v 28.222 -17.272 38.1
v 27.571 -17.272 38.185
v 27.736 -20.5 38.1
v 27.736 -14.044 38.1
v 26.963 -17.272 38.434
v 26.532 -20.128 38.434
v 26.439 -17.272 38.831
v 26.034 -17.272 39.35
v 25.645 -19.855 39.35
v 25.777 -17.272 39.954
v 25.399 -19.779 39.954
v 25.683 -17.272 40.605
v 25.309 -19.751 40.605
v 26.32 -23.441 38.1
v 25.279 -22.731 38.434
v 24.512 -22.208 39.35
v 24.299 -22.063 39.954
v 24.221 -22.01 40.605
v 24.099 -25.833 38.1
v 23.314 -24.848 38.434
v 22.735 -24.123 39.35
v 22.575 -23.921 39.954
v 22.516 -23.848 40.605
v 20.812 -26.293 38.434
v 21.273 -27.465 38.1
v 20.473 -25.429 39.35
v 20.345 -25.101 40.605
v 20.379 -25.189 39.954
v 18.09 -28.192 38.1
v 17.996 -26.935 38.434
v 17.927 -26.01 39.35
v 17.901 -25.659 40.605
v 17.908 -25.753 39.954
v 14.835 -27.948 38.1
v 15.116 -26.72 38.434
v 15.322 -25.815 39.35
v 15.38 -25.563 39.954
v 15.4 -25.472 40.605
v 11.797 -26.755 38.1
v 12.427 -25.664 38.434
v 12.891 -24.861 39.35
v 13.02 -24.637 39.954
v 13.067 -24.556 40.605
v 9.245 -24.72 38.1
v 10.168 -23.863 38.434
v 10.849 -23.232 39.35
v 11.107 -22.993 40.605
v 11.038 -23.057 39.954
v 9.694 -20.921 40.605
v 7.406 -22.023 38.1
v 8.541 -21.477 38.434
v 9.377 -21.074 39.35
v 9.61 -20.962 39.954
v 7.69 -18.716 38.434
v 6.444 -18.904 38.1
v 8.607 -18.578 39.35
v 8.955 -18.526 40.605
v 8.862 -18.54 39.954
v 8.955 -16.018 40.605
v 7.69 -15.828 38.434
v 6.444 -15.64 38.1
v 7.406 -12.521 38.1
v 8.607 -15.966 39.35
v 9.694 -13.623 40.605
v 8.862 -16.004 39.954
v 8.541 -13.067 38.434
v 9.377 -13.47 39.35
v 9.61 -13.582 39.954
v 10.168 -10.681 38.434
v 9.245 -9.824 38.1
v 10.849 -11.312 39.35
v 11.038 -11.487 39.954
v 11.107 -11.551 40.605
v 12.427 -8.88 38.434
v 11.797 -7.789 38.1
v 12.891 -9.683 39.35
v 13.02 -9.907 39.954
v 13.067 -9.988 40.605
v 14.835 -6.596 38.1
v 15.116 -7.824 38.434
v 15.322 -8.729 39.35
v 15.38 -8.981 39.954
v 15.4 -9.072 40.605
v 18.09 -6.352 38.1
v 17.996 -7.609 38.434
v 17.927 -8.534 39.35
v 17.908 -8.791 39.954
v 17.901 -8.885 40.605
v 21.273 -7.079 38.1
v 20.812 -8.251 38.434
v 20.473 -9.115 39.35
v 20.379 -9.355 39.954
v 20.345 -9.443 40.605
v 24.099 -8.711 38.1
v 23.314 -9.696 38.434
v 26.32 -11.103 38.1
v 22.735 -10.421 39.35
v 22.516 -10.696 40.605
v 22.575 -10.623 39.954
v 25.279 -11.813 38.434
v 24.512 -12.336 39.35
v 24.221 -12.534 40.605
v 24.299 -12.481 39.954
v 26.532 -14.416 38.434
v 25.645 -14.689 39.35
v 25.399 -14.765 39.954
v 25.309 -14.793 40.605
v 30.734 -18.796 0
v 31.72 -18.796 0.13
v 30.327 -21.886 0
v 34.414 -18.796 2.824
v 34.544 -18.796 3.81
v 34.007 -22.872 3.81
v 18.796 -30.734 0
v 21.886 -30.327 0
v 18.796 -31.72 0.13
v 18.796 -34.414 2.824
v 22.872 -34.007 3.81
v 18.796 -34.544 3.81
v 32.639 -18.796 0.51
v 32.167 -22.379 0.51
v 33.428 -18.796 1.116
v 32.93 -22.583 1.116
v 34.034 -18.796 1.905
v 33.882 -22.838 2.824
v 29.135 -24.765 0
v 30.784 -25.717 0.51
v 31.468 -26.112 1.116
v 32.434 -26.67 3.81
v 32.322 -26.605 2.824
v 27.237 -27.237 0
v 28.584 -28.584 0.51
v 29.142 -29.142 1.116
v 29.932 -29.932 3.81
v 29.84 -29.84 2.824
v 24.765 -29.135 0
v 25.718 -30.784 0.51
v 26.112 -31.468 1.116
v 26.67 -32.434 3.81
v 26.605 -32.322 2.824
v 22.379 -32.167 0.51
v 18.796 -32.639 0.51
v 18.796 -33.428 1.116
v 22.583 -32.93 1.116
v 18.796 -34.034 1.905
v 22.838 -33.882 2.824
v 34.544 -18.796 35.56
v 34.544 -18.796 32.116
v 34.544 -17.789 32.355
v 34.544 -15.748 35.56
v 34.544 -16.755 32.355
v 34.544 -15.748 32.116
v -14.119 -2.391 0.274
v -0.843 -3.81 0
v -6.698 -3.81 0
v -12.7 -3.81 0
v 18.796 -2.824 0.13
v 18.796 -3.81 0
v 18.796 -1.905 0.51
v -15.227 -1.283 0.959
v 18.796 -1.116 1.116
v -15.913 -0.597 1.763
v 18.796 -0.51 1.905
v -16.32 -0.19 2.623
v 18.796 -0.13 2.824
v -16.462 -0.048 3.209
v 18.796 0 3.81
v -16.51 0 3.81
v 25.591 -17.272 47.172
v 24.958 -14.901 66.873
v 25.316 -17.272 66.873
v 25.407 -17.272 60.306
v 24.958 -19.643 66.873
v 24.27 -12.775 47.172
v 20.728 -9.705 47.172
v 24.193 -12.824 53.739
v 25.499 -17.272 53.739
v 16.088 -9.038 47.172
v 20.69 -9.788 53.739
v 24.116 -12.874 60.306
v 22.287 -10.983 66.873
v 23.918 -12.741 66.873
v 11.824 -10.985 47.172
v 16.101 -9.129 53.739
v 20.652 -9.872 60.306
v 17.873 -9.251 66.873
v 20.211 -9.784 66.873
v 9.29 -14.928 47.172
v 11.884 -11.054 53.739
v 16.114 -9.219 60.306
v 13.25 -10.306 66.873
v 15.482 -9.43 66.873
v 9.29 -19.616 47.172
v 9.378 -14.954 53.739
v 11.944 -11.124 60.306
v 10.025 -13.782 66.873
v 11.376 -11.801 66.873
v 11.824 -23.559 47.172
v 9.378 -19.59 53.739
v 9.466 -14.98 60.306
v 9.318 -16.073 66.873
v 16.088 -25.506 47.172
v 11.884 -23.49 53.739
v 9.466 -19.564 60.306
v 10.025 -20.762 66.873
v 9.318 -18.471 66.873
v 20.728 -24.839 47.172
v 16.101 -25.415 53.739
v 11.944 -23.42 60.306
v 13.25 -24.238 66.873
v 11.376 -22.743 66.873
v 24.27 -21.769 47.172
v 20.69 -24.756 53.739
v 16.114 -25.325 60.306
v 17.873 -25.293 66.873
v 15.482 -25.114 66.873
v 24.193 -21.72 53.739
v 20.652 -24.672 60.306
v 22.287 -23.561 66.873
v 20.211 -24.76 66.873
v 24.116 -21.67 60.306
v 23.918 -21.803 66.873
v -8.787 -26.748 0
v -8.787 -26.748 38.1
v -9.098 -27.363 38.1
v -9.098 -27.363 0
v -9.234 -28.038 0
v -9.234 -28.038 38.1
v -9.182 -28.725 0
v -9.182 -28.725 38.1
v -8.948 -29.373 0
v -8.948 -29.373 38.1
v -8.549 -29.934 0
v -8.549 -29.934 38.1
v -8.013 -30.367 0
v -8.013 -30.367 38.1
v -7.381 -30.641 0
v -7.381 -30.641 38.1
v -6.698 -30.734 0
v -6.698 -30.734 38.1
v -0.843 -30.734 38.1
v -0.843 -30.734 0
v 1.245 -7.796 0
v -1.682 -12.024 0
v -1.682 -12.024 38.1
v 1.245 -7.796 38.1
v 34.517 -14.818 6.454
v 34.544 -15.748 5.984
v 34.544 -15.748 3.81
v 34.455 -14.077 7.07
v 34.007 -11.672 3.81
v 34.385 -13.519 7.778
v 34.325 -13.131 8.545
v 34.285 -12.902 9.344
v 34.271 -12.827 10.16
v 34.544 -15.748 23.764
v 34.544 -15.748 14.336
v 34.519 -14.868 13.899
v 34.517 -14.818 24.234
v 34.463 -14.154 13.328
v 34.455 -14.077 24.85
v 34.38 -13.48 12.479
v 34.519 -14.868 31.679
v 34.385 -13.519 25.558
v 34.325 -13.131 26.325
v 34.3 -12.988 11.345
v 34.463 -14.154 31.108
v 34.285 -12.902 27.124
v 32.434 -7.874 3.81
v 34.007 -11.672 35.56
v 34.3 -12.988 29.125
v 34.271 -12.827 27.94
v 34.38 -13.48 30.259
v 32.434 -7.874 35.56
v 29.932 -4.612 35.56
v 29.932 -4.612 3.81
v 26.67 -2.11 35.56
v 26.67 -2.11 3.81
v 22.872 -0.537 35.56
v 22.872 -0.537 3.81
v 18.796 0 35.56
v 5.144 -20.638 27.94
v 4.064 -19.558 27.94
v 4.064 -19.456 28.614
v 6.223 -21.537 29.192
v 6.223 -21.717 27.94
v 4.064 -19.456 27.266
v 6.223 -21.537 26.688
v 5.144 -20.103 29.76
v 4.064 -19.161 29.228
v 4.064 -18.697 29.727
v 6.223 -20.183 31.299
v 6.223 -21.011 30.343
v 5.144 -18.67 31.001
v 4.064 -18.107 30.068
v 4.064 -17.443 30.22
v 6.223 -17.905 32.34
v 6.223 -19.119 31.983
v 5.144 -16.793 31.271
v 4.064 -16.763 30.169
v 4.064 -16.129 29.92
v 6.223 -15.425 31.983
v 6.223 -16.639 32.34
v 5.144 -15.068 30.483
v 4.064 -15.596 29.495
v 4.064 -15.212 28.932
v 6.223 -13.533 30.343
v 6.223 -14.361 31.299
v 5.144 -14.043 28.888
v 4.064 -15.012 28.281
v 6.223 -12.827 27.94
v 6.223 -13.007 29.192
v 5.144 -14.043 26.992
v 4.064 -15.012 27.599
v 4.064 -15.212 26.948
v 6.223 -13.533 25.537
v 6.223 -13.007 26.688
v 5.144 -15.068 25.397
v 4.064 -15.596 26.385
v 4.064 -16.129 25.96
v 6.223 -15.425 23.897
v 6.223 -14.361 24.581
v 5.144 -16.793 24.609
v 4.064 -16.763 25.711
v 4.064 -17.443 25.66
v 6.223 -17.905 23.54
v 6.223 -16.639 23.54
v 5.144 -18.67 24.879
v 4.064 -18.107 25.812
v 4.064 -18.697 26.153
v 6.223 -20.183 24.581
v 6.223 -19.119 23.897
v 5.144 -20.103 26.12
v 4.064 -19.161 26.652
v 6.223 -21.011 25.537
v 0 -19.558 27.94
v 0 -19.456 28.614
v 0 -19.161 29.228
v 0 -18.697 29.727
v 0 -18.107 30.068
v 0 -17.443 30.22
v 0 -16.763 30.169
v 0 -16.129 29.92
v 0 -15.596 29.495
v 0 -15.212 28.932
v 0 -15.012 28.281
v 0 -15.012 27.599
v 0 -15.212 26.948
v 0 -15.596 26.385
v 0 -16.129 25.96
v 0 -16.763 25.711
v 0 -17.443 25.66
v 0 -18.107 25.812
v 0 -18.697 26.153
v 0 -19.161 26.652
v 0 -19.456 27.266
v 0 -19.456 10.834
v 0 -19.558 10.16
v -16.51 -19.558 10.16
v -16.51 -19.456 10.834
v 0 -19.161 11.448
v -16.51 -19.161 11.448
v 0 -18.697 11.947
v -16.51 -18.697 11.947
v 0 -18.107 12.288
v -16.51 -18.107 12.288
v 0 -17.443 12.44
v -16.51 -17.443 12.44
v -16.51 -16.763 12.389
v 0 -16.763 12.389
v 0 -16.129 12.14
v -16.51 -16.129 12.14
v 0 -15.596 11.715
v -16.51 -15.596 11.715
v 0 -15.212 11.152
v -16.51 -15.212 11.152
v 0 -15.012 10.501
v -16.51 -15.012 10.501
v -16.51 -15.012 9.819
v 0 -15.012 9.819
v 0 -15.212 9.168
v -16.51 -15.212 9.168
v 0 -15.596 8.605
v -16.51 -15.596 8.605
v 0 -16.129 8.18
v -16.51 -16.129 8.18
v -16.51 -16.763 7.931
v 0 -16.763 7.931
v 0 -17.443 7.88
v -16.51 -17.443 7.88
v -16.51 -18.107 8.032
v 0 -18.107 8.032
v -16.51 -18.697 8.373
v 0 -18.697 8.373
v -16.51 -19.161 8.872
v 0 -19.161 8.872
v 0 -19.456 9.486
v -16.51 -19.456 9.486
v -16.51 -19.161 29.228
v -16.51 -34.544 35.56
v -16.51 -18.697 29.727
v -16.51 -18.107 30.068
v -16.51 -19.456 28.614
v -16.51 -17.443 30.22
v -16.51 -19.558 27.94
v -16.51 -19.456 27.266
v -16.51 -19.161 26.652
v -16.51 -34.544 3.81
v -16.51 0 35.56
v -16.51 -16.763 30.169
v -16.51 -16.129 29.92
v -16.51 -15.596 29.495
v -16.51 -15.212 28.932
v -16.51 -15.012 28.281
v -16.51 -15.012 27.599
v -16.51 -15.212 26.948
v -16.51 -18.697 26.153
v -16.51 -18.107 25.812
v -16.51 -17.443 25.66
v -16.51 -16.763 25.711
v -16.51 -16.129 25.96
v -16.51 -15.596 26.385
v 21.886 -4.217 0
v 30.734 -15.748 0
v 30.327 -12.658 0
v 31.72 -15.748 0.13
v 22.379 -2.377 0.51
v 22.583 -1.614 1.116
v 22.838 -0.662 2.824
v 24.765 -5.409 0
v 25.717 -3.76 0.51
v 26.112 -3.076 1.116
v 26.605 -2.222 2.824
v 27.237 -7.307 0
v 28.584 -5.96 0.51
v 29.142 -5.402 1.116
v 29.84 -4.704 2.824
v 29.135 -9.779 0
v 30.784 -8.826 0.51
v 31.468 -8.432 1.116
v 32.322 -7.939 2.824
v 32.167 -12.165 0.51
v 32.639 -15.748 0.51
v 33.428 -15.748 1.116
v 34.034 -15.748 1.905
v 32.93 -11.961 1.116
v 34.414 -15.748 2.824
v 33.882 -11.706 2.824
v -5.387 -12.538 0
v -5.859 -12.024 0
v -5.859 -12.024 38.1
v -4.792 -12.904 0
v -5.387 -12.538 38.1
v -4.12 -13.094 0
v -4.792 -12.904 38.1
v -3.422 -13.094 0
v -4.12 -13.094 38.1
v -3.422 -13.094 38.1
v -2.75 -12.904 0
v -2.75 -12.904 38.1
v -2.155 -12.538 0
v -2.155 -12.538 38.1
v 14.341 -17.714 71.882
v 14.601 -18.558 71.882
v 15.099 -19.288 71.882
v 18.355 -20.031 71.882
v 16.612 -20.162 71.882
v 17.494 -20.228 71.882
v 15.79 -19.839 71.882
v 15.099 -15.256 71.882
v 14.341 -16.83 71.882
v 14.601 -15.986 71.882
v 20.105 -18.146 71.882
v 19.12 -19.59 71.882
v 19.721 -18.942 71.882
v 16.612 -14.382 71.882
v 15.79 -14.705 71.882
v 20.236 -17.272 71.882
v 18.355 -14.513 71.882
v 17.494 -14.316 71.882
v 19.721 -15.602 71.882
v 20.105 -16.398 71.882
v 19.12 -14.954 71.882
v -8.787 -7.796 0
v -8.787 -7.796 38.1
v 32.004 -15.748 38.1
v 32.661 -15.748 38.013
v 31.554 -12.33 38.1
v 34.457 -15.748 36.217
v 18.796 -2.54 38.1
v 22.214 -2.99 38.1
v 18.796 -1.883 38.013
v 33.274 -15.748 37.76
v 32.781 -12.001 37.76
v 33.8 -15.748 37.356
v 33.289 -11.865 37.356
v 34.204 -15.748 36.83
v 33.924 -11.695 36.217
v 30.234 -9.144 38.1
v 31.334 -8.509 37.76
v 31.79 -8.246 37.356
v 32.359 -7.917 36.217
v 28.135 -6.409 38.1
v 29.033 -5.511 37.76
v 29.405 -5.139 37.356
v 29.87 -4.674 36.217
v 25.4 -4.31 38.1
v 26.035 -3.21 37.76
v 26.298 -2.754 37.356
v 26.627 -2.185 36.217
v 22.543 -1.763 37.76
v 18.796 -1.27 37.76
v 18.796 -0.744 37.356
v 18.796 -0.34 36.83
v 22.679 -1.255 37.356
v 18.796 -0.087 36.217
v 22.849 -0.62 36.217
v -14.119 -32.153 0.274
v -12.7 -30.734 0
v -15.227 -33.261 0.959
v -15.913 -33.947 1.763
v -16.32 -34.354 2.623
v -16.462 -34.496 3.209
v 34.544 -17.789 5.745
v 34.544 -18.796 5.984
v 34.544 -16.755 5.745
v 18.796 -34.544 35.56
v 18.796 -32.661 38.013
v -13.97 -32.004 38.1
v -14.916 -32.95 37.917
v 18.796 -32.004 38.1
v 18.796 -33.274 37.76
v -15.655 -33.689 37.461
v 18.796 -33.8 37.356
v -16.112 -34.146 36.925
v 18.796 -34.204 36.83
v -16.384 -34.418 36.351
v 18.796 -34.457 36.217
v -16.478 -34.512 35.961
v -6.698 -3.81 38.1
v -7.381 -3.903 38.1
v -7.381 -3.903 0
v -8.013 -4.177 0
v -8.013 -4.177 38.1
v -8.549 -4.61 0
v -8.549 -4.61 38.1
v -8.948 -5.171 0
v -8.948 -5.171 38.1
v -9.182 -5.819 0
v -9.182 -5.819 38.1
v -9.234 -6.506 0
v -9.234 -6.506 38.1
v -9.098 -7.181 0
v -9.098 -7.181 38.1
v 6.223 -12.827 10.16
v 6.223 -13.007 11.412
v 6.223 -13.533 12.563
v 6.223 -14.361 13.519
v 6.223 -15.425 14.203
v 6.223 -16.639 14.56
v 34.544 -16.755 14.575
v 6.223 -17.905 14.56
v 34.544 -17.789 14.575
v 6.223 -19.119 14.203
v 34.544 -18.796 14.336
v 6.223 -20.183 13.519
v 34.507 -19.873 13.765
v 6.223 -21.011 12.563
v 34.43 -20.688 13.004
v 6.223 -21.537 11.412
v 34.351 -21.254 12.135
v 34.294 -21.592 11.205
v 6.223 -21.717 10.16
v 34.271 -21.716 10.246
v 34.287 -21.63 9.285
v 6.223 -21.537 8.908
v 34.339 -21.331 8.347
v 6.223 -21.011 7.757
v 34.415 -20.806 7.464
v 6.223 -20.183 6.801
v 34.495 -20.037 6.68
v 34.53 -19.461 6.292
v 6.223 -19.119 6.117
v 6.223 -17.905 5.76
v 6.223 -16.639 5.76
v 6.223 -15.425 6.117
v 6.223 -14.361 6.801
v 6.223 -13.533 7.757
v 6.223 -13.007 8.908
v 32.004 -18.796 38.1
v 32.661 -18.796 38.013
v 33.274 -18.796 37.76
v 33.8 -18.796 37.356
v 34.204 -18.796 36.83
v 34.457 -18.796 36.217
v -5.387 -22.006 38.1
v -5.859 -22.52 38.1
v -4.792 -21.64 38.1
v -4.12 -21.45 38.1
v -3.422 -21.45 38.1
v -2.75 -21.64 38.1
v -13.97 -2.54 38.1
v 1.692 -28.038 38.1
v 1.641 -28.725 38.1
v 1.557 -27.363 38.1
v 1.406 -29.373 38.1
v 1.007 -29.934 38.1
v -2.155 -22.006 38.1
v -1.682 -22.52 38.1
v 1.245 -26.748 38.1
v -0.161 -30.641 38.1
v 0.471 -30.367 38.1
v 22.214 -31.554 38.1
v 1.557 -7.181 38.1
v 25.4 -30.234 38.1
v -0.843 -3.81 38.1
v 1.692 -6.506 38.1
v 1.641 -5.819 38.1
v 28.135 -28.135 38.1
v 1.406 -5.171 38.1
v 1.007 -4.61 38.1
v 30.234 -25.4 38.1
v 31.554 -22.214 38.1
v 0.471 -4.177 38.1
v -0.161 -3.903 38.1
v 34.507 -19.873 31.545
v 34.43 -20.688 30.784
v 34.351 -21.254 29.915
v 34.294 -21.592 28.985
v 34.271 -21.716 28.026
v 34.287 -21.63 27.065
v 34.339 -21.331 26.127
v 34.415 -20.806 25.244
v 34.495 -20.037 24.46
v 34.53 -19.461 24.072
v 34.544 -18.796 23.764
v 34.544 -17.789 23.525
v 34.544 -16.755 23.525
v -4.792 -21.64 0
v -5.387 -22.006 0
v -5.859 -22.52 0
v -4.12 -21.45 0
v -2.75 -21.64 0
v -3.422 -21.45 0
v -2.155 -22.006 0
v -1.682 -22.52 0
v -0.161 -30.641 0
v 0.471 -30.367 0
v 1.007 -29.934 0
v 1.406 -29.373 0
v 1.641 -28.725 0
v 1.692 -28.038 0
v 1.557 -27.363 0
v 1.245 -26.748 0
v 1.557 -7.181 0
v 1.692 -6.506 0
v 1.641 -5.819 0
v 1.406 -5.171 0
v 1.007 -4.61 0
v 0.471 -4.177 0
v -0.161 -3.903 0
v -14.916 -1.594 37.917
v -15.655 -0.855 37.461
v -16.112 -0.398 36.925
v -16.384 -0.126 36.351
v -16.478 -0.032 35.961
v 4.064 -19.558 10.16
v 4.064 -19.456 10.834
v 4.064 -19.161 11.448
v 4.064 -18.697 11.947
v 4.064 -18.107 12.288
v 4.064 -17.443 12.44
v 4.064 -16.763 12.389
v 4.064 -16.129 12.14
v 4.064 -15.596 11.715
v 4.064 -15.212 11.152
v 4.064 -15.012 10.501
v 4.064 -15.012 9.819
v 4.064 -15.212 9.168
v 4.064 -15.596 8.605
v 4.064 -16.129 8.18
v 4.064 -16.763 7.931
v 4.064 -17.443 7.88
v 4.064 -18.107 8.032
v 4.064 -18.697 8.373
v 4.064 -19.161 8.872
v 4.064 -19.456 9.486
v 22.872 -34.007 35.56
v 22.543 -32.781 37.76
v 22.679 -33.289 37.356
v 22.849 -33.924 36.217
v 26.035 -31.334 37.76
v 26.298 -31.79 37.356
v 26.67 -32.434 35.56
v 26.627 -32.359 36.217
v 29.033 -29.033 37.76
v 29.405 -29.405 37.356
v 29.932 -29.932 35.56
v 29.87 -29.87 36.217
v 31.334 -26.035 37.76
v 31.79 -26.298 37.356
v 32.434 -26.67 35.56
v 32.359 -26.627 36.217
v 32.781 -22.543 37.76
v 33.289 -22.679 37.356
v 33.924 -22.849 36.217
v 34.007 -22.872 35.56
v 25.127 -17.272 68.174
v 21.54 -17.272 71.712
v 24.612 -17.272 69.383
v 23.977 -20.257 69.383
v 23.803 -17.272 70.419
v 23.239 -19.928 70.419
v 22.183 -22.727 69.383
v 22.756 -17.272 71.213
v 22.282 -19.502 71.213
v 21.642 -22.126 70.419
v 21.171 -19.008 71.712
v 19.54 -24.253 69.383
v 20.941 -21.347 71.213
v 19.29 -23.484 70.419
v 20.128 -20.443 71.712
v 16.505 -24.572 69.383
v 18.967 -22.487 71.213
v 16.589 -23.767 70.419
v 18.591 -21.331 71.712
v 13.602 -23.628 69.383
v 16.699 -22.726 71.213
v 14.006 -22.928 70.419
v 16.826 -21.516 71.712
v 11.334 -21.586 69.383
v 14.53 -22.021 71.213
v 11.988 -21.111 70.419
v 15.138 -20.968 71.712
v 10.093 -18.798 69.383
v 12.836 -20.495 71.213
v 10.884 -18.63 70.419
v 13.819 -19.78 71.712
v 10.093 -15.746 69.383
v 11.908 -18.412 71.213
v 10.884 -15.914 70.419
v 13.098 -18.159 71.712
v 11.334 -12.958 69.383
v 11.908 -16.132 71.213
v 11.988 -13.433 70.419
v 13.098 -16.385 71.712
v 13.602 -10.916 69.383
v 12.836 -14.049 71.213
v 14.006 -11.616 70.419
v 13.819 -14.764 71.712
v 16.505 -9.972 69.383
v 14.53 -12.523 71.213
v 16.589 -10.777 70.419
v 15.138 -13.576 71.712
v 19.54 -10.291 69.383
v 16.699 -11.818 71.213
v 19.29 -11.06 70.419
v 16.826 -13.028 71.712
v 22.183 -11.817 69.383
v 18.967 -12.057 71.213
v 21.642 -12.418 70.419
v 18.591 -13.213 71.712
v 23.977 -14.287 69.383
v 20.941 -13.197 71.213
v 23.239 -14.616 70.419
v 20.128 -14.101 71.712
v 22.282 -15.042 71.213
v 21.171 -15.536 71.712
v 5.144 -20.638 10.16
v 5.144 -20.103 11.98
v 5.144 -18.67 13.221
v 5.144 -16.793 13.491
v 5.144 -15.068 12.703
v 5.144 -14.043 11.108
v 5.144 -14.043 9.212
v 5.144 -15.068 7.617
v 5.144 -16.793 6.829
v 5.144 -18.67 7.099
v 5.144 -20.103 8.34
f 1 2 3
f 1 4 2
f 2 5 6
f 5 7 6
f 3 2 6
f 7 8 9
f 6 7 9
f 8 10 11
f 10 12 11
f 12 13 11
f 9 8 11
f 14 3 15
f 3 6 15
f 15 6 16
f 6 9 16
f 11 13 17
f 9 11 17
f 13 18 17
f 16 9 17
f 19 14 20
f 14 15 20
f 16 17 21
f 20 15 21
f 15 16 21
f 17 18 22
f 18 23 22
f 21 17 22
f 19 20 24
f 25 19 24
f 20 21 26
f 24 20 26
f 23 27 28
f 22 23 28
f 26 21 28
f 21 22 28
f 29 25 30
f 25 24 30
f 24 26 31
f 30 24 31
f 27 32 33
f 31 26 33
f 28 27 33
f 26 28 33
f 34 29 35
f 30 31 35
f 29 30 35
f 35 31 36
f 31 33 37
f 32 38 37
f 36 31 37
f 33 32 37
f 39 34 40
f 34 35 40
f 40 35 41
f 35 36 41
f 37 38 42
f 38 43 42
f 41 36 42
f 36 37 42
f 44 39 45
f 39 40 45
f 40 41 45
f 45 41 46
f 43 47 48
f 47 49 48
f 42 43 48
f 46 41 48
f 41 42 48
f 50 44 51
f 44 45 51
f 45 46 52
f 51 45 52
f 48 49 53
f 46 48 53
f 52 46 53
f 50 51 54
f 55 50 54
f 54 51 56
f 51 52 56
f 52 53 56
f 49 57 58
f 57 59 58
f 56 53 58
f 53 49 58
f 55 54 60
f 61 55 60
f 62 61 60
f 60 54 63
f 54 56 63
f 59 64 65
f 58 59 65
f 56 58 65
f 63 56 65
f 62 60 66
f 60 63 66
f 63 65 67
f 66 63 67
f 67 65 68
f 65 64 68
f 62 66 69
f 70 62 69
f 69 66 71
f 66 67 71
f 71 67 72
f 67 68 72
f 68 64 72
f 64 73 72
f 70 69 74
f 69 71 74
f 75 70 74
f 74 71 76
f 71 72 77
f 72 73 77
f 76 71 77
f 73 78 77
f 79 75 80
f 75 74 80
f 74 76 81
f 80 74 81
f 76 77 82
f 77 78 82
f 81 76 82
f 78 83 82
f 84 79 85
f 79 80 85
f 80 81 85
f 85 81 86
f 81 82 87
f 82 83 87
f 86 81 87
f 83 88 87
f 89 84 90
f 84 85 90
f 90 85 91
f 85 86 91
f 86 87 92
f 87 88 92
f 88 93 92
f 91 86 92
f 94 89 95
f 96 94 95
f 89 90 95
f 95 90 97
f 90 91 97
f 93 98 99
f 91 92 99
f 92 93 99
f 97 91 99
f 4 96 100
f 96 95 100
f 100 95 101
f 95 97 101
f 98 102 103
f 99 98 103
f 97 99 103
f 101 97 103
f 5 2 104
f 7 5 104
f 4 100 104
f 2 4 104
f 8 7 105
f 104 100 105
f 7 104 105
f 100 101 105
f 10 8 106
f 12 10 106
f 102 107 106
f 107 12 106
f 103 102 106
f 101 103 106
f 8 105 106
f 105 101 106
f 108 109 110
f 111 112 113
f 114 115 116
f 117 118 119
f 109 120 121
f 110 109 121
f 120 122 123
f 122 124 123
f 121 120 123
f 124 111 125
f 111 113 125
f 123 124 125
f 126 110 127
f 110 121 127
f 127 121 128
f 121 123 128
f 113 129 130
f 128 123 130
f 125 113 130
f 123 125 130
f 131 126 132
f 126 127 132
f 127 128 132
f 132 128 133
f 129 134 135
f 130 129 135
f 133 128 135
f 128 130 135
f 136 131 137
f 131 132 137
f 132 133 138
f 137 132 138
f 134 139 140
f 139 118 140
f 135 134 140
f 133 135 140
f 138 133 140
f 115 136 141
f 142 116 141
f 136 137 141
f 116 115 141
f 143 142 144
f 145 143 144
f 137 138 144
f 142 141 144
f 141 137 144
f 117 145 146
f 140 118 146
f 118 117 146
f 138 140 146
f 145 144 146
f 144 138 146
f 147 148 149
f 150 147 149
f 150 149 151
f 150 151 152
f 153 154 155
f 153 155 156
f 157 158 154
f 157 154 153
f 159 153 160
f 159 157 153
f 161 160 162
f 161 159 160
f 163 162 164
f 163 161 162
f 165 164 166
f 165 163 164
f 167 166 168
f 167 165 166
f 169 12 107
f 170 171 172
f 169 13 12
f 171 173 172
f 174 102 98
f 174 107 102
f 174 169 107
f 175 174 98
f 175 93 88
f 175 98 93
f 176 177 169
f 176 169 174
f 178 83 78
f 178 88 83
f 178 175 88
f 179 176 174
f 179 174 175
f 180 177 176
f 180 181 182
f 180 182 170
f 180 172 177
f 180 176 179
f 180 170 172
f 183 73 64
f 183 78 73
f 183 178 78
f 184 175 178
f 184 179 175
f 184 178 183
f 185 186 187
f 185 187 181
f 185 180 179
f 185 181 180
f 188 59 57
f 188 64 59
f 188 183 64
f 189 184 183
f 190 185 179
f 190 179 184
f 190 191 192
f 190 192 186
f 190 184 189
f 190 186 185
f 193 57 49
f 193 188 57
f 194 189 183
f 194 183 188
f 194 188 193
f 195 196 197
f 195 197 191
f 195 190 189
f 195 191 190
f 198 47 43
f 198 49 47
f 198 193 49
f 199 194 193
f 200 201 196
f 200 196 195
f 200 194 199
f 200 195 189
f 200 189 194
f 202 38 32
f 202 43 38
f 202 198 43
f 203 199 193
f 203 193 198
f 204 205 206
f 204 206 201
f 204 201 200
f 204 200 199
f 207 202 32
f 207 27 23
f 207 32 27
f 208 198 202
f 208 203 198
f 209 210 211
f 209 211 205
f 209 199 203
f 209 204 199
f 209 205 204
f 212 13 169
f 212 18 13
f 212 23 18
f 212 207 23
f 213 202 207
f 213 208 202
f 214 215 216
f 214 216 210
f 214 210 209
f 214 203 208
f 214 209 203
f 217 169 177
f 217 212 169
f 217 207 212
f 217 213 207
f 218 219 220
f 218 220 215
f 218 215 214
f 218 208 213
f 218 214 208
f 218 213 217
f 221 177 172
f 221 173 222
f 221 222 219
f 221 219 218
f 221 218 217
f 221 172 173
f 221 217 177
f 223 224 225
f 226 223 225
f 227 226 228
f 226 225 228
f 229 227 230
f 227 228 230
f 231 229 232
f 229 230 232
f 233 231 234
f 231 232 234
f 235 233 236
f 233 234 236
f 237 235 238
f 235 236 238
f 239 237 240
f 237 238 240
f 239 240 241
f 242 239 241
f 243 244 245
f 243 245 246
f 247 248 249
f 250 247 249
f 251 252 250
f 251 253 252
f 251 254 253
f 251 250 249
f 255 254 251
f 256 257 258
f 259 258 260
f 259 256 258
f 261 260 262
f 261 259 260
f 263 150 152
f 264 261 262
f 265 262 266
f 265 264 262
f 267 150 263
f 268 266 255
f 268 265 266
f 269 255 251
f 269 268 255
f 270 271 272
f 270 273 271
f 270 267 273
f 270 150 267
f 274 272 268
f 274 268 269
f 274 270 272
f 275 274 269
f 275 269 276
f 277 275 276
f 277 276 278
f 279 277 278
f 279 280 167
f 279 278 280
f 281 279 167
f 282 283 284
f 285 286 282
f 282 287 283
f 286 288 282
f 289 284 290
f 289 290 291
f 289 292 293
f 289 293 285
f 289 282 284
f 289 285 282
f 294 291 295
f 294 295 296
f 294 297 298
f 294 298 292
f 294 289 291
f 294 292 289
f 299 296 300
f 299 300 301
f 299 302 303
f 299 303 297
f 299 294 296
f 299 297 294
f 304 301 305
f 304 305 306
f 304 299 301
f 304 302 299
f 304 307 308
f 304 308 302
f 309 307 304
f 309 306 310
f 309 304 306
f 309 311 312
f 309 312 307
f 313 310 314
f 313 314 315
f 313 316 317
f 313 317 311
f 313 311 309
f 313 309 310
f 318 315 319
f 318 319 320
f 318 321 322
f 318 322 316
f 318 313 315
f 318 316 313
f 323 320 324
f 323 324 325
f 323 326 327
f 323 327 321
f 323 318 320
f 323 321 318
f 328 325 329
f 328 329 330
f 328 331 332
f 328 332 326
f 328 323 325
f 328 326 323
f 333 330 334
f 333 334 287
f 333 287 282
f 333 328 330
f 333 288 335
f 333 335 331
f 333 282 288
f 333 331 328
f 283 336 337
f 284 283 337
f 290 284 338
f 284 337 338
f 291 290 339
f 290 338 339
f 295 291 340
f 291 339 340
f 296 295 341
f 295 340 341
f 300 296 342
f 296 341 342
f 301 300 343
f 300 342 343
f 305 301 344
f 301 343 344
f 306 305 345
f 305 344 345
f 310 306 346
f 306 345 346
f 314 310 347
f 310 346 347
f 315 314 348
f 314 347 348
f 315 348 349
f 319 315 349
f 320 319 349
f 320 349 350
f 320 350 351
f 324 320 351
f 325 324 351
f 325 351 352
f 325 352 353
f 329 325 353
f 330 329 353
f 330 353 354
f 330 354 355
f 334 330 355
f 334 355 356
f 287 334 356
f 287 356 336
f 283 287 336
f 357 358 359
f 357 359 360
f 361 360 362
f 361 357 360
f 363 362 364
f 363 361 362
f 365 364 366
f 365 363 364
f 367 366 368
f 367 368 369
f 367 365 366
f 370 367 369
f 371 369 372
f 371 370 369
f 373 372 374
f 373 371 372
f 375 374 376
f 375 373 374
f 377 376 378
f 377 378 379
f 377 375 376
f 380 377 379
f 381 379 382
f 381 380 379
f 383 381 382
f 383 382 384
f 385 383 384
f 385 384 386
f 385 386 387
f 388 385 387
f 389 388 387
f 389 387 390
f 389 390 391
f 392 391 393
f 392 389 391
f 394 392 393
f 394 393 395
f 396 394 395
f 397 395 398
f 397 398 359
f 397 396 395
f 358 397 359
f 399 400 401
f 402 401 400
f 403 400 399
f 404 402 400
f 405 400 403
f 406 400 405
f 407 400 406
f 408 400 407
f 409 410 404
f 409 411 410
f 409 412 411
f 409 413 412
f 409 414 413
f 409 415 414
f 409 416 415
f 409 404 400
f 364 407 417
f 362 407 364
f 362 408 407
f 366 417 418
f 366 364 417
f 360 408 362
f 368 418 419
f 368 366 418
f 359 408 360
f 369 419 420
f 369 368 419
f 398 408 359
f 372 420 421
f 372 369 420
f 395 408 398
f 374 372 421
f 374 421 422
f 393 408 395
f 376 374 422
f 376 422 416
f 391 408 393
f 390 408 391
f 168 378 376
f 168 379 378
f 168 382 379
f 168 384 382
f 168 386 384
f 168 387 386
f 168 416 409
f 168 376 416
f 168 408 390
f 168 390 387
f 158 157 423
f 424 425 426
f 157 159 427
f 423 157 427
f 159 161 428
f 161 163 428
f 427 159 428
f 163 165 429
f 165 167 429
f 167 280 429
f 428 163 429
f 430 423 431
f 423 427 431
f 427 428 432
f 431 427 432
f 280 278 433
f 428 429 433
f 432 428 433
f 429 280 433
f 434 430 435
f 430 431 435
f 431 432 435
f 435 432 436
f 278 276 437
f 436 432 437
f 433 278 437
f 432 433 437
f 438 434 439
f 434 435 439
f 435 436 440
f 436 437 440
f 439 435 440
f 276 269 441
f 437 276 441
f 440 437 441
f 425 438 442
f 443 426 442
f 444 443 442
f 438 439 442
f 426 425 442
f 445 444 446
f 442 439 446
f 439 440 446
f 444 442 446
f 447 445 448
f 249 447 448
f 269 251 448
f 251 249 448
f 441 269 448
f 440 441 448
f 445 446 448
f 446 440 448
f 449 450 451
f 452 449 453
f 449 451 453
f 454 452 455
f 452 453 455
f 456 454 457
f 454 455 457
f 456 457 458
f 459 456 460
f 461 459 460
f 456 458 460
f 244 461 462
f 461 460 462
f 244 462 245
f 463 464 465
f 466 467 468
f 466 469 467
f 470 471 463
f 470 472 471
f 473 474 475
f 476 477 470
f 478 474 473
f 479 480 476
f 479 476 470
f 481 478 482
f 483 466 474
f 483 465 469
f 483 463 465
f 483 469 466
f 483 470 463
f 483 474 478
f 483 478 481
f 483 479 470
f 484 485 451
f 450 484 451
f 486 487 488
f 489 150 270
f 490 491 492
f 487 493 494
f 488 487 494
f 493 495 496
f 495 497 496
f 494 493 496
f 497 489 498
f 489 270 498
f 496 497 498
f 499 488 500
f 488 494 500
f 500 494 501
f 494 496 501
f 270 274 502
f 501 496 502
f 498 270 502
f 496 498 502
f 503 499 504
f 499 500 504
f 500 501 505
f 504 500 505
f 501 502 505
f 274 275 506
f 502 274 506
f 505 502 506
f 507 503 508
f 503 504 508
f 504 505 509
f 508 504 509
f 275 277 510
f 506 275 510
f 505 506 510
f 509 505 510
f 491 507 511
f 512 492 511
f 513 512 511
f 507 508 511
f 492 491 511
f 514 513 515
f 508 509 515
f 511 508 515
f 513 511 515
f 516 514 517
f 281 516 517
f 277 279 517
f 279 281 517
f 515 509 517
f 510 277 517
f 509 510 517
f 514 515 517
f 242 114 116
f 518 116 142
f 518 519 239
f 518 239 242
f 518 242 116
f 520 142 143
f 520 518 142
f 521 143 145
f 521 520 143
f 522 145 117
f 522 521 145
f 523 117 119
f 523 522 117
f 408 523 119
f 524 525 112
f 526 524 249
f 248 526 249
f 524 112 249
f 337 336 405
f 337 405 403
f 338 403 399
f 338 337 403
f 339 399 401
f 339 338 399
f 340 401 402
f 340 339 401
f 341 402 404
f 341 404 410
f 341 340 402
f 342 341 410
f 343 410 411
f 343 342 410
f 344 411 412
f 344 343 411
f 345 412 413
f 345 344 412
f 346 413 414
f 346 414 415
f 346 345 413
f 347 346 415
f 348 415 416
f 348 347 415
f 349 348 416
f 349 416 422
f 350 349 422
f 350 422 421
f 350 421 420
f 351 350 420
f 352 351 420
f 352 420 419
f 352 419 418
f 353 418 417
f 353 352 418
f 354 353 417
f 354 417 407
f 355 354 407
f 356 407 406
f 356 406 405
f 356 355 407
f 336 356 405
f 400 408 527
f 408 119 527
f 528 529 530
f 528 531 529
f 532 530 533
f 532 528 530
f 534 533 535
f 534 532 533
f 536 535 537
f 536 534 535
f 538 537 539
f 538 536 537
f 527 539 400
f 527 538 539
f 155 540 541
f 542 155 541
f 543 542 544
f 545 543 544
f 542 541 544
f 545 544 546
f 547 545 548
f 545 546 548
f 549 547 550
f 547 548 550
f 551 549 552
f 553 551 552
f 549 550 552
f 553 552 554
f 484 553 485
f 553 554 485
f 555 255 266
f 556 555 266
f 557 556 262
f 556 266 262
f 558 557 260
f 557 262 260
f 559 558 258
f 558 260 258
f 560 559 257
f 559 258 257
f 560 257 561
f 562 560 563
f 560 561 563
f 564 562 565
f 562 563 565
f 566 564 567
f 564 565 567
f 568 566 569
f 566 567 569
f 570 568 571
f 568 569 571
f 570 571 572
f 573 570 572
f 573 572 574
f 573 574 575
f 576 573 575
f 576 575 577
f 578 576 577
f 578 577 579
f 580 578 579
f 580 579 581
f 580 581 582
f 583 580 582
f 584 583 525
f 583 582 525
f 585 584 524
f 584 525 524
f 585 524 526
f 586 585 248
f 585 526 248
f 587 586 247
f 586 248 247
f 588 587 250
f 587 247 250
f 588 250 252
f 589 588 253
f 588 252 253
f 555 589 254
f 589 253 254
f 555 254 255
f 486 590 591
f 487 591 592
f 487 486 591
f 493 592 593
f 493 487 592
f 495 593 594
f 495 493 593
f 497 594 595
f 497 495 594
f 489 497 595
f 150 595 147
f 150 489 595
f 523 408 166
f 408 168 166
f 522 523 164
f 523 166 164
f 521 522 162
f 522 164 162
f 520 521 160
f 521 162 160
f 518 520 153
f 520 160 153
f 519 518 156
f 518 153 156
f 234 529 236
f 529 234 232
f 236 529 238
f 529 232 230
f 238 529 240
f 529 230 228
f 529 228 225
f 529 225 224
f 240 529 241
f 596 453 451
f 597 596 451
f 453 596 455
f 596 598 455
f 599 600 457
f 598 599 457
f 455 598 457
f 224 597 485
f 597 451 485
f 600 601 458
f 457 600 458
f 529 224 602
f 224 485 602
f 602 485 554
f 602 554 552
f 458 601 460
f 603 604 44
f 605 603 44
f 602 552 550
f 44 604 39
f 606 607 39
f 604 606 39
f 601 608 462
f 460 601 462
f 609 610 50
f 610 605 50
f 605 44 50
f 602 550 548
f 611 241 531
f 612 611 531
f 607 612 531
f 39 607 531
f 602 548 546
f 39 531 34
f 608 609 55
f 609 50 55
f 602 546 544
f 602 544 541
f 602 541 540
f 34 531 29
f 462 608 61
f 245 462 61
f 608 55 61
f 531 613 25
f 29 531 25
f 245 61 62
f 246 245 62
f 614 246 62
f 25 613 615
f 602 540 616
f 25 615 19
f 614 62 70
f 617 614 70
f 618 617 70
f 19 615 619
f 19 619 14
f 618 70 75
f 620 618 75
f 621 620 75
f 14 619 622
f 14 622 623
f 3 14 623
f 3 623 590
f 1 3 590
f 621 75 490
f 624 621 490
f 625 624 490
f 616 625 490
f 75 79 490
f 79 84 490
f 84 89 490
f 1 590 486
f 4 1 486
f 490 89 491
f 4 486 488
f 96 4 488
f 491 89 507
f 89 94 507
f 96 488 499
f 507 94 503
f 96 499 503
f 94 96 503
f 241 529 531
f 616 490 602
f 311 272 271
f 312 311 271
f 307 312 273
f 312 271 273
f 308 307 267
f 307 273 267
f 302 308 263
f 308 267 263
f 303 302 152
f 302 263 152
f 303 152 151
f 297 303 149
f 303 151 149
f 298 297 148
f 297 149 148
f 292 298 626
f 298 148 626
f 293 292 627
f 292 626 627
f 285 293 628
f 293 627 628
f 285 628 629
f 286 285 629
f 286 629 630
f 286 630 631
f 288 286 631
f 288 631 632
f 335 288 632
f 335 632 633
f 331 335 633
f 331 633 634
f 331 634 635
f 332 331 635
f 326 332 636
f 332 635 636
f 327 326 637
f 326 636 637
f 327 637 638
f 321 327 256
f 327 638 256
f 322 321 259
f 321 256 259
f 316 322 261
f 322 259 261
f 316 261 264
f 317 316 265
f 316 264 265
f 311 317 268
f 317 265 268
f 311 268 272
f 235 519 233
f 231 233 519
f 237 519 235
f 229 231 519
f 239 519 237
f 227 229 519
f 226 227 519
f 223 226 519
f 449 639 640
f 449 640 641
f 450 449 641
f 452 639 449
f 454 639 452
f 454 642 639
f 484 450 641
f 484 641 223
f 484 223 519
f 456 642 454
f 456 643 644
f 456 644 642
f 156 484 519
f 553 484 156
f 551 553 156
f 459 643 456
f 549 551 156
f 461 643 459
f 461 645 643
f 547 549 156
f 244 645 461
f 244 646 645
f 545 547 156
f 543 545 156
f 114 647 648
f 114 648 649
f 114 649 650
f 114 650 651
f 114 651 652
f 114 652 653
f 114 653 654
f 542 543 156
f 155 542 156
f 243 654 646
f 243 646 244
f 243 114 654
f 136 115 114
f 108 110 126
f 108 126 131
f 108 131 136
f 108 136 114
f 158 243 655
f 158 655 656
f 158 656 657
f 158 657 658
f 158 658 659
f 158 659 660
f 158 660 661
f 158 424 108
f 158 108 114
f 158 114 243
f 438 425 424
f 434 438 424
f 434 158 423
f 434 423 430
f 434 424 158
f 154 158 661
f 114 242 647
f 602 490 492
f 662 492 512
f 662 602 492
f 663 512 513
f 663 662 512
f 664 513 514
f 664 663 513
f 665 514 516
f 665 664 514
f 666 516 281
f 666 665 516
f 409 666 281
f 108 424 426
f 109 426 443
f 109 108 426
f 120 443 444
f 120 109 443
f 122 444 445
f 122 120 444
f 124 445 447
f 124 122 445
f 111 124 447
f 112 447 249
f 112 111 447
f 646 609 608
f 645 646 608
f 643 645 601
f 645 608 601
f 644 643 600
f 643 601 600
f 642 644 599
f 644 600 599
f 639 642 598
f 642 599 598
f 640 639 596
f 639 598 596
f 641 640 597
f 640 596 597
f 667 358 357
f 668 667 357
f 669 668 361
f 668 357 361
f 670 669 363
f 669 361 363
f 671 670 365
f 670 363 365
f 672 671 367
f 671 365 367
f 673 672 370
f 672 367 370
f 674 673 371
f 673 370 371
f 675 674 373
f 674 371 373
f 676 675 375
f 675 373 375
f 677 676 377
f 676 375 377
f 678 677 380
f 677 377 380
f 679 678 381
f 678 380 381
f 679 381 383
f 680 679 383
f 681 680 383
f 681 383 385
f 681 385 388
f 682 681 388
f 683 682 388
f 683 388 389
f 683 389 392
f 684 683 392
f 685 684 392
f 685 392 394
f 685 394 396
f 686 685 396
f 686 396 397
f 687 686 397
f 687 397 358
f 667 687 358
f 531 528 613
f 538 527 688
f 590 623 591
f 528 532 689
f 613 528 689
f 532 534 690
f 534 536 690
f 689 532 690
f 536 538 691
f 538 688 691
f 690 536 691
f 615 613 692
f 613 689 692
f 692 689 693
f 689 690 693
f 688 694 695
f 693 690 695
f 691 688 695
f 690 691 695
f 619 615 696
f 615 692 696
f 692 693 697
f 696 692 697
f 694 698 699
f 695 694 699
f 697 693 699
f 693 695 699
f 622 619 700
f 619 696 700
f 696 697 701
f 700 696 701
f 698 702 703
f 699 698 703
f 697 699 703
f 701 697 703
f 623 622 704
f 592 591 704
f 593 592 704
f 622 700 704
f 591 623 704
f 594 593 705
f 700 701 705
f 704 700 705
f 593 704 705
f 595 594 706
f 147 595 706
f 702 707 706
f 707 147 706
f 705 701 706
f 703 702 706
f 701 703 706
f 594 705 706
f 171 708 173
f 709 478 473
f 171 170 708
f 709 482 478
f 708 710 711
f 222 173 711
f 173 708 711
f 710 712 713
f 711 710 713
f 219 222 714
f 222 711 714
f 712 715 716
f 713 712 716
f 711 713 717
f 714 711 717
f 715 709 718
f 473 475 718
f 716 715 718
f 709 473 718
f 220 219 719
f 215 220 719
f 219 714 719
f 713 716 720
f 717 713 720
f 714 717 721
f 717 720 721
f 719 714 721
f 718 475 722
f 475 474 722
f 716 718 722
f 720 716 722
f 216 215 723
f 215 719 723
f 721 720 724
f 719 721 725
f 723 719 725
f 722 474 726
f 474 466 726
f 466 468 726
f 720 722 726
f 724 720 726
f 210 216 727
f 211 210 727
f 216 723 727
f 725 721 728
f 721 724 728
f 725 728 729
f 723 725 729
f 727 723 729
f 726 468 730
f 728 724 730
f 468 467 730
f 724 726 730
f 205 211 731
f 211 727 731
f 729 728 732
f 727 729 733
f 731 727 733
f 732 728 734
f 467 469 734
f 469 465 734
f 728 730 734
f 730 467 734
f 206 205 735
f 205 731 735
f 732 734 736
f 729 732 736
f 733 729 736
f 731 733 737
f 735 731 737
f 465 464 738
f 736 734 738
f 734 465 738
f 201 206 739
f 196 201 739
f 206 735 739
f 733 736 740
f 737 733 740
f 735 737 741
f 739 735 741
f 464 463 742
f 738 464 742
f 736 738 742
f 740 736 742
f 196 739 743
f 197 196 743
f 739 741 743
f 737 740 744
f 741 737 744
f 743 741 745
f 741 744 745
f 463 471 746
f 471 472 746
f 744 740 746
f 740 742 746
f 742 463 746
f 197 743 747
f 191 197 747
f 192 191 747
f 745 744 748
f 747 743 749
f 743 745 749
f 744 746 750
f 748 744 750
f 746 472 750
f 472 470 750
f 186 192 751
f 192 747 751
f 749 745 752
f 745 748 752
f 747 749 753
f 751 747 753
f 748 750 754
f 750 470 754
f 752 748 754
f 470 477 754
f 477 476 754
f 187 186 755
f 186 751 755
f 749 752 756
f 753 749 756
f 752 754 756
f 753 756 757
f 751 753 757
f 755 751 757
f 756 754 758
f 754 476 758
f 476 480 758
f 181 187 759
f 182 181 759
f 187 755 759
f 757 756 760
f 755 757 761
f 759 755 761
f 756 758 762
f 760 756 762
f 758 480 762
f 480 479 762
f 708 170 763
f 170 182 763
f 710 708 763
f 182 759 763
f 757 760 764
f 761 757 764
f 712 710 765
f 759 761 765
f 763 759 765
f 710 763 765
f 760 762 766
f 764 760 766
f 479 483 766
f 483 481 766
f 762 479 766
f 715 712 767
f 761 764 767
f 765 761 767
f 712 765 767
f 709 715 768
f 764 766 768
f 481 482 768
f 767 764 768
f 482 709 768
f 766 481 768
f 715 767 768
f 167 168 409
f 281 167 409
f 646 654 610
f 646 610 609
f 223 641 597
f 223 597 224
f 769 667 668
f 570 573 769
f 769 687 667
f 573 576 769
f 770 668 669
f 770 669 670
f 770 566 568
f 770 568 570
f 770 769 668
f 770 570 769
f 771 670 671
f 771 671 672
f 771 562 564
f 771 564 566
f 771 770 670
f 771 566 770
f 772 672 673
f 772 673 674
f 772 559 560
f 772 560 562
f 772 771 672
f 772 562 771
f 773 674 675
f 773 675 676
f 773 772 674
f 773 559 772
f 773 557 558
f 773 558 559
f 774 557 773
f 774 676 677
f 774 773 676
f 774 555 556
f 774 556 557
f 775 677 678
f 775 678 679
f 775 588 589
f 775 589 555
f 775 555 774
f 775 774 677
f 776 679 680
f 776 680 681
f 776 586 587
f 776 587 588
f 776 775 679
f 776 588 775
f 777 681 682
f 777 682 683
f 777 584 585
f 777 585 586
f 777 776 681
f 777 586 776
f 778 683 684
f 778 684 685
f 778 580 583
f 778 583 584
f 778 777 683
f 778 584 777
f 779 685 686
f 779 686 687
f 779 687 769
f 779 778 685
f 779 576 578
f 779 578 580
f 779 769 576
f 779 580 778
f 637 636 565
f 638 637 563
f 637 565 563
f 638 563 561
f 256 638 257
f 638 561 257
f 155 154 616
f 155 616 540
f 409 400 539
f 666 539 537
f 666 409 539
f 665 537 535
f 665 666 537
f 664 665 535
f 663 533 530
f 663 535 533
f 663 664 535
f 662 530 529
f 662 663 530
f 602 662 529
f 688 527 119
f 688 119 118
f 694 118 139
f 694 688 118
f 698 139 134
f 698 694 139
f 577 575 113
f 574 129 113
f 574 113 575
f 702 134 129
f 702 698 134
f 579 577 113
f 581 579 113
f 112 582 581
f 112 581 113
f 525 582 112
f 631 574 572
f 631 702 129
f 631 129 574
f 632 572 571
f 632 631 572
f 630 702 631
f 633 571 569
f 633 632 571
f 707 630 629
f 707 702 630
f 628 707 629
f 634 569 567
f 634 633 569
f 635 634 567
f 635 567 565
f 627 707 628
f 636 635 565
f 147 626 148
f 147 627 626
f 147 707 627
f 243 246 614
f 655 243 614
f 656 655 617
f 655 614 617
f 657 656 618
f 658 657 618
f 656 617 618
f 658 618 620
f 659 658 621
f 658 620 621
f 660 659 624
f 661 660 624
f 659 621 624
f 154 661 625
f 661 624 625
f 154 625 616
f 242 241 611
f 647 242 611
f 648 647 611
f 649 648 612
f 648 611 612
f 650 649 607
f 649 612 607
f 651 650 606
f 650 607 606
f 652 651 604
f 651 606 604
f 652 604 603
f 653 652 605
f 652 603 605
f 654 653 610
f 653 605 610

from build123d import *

# Parameters (mm, degrees)
F0_W         = 34.544
F0_H         = 34.544
F1_DEPTH     = 38.1
F3_R         = 15.748
F4_R         = 2.286
F5_DEPTH     = 34.545
F6_R         = 4.445
F7_DEPTH     = 27.94
F8_S5_R      = 4.445
F8_T6_DEPTH  = 8
F8_S11_R     = 4.445
F8_T12_DEPTH = 8
F9_DEPTH     = 16.51
F2_R         = 8.4455
F10_DEPTH    = 33.782
F10_TAPER    = 0.8
F11_R        = 2.54
F12_R        = 3.81
F13_R        = 5.08
F15_DEPTH    = 38.101


# Not quite as in the source:
# - a fillet or chamfer that OpenCascade refuses, or shapes differently, is made with other operations: its cross-section is extruded or revolved along the edge and cut away or added


with BuildPart() as f1:
    # F0 (on Top) → F1 (new body)
    with BuildSketch(Plane.XY):
        with Locations((17.272, -17.272)):
            Rectangle(F0_W, F0_H)
    extrude(amount=F1_DEPTH)

    # F3
    f3_edges = [f1.edges().sort_by_distance(p)[0] for p in [
        (34.544, -34.544, 19.05),
        (34.544, 0, 19.05),
    ]]
    fillet(f3_edges, radius=F3_R)

    # F4 (on face) → F5 (cut, through all)
    with BuildSketch(Plane(origin=(0, 0, 0), x_dir=(0, -1, 0), z_dir=(-1, 0, 0))):
        with Locations((17.272, 10.16)):
            Circle(F4_R)
        with Locations((17.272, 27.94)):
            Circle(F4_R)
    extrude(amount=-F5_DEPTH, mode=Mode.SUBTRACT)

    # F6 (on face) → F7 (cut)
    with BuildSketch(Plane.YZ.offset(34.544)):
        with Locations((-17.272, 27.94)):
            Circle(F6_R)
        with Locations((-17.272, 10.16)):
            Circle(F6_R)
    extrude(amount=-F7_DEPTH, mode=Mode.SUBTRACT)

    # F8: chamfer of 2.54 on 2 edges, made by hand


with BuildPart() as f8_tool2:
    # F8_s3 → F8_t4 (revolve)
    with BuildSketch(Plane.XY.offset(27.94)):
        Polygon((4.064, -19.558), (6.604, -22.098), (6.604, -19.558), align=None)
    revolve(axis=Axis((6.604, -17.272, 27.94), (-1, 0, 0)))

    # F8_s5 → F8_t6 (intersect, symmetric)
    with BuildSketch(Plane.YZ.offset(5.3)):
        with Locations((-17.272, 27.94)):
            Circle(F8_S5_R)
    extrude(amount=F8_T6_DEPTH, both=True, mode=Mode.INTERSECT)


with BuildPart() as f1_1:
    add(f1.part)

    # F8_t1: cut F8_tool2
    add(f8_tool2.part, mode=Mode.SUBTRACT)


with BuildPart() as f8_tool8:
    # F8_s9 → F8_t10 (revolve)
    with BuildSketch(Plane.XY.offset(10.16)):
        Polygon((4.064, -19.558), (6.604, -22.098), (6.604, -19.558), align=None)
    revolve(axis=Axis((6.604, -17.272, 10.16), (-1, 0, 0)))

    # F8_s11 → F8_t12 (intersect, symmetric)
    with BuildSketch(Plane.YZ.offset(5.3)):
        with Locations((-17.272, 10.16)):
            Circle(F8_S11_R)
    extrude(amount=F8_T12_DEPTH, both=True, mode=Mode.INTERSECT)


with BuildPart() as f1_2:
    add(f1_1.part)

    # F8_t7: cut F8_tool8
    add(f8_tool8.part, mode=Mode.SUBTRACT)

    # F9 (add): a face of the model
    f9_faces = [f1_2.faces().sort_by_distance(p)[0] for p in [
        (0, -17.272, 19.05),
    ]]
    extrude(f9_faces, amount=F9_DEPTH)

    # F2 (on face) → F10 (join)
    with BuildSketch(Plane.XY.offset(38.1)):
        with Locations((17.272, -17.272)):
            Circle(F2_R)
    extrude(amount=F10_DEPTH, taper=F10_TAPER)

    # F11
    f11_edges = [f1_2.edges().sort_by_distance(p)[0] for p in [
        (1.143, 0, 38.1),
        (-16.51, -17.272, 38.1),
        (29.931518, -4.612482, 38.1),
        (1.143, -34.544, 38.1),
        (34.544, -17.272, 38.1),
        (29.931518, -29.931518, 38.1),
        (8.8265, -17.272, 38.1),
    ]]
    fillet(f11_edges, radius=F11_R)

    # F12
    f12_edges = [f1_2.edges().sort_by_distance(p)[0] for p in [
        (1.143, 0, 0),
        (-16.51, -17.272, 0),
        (1.143, -34.544, 0),
        (29.931518, -29.931518, 0),
        (34.544, -17.272, 0),
        (29.931518, -4.612482, 0),
    ]]
    fillet(f12_edges, radius=F12_R)

    # F13
    f13_edges = [f1_2.edges().sort_by_distance(p)[0] for p in [
        (9.298216, -17.272, 71.882),
    ]]
    fillet(f13_edges, radius=F13_R)

    # F14 (on face) → F15 (cut, through all)
    with BuildSketch(Plane.XY.offset(38.1)):
        with BuildLine():
            ThreePointArc((-6.6983271655, -3.81), (-8.9482084501, -5.1711725294), (-8.7866908377, -7.7957998383))
            Line((-8.7866908377, -7.7957998383), (-5.8592190016, -12.0243421801))
            ThreePointArc((-5.8592190016, -12.0243421801), (-3.7708553294, -13.1185423418), (-1.6824916571, -12.0243421801))
            Line((-1.6824916571, -12.0243421801), (1.244980179, -7.7957998383))
            ThreePointArc((1.244980179, -7.7957998383), (1.4064977914, -5.1711725294), (-0.8433834932, -3.81))
            Line((-0.8433834932, -3.81), (-6.6983271655, -3.81))
        make_face()
        with BuildLine():
            ThreePointArc((-1.6824916571, -22.5196578199), (-3.7708553294, -21.4254576582), (-5.8592190016, -22.5196578199))
            Line((-5.8592190016, -22.5196578199), (-8.7866908377, -26.7482001617))
            ThreePointArc((-8.7866908377, -26.7482001617), (-8.9482084501, -29.3728274706), (-6.6983271655, -30.734))
            Line((-6.6983271655, -30.734), (-0.8433834932, -30.734))
            ThreePointArc((-0.8433834932, -30.734), (1.4064977914, -29.3728274706), (1.244980179, -26.7482001617))
            Line((1.244980179, -26.7482001617), (-1.6824916571, -22.5196578199))
        make_face()
    extrude(amount=-F15_DEPTH, mode=Mode.SUBTRACT)


solid = f1_2.part
